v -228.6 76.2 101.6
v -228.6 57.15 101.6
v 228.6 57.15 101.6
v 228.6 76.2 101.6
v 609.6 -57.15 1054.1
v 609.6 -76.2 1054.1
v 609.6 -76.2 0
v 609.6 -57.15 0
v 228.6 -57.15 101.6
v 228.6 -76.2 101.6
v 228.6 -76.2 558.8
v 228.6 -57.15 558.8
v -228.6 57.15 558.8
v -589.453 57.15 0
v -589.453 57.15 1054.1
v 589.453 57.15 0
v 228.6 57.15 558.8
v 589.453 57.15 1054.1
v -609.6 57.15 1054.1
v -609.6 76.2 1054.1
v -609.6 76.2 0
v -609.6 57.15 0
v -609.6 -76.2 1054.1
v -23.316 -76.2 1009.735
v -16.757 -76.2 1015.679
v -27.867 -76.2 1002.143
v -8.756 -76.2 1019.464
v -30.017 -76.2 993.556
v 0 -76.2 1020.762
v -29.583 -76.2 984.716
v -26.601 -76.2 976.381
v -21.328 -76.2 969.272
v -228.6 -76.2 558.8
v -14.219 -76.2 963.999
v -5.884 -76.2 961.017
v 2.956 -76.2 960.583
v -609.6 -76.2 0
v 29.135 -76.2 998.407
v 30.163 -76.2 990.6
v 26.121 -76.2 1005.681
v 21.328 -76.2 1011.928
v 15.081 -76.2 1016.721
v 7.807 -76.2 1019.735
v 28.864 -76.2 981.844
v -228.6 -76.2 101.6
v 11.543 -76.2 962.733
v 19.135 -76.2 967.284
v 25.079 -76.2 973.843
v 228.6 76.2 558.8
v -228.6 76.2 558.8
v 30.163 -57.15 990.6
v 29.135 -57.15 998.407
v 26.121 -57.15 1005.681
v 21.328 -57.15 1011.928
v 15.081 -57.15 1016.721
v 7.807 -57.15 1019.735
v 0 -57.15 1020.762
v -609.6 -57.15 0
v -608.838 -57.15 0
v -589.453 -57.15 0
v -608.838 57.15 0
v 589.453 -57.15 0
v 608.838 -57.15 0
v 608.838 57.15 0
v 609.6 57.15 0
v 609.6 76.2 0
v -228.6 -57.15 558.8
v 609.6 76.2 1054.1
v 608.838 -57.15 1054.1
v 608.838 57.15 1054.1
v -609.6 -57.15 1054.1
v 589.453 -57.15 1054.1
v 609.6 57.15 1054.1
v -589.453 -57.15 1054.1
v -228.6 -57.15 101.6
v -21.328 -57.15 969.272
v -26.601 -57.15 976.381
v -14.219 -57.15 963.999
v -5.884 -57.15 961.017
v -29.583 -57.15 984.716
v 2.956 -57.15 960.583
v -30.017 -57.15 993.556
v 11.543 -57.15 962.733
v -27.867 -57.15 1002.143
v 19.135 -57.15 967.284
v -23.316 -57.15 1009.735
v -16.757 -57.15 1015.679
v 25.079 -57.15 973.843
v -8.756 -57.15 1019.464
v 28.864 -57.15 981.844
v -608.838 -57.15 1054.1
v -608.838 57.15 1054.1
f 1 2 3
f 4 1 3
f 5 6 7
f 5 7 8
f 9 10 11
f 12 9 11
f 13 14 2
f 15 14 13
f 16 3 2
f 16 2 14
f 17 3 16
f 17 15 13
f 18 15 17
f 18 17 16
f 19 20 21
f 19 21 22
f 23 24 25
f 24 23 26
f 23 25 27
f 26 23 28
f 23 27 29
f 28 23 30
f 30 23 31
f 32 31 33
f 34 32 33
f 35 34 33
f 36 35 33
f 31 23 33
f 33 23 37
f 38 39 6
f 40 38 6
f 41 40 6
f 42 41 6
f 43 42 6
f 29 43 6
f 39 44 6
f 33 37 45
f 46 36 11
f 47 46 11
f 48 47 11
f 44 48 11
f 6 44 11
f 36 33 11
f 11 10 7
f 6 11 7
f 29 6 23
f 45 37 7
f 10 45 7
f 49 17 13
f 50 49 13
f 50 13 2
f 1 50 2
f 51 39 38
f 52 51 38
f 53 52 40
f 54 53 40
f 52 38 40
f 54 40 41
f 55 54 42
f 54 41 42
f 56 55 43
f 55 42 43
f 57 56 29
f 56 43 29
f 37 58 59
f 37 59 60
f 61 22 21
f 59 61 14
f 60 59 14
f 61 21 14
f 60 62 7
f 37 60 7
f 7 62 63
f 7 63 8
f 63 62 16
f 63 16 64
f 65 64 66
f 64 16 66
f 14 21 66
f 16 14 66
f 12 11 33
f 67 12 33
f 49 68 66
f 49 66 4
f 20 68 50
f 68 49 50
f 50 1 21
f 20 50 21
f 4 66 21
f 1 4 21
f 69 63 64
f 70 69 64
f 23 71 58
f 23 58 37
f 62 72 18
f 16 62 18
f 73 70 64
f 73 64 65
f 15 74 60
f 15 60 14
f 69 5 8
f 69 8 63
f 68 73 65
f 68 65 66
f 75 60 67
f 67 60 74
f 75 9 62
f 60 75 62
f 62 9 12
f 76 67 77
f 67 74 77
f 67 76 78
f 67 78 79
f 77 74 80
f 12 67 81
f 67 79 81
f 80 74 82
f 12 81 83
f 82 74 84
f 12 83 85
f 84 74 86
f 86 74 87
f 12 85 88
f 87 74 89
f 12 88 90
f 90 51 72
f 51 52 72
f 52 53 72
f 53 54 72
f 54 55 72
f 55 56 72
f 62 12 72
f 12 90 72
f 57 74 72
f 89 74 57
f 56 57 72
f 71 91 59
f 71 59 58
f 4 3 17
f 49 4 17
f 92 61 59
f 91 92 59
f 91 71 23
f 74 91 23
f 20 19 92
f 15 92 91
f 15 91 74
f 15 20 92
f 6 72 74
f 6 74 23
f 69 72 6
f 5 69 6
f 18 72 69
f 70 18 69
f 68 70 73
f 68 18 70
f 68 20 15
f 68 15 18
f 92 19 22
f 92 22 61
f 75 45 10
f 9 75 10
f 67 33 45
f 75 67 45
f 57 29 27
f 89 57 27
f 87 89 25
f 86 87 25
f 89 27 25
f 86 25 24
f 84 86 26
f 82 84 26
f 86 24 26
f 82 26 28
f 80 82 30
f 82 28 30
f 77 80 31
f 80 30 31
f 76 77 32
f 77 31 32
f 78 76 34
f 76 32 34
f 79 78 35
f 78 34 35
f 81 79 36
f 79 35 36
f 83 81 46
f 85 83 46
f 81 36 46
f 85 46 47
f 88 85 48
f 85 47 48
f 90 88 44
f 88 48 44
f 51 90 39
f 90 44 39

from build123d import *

# Parameters (mm, degrees)
F1_DEPTH = 1054.1
F3_DEPTH = 152.4
F4_W     = 1178.906798
F4_H     = 114.3
F5_DEPTH = 1270
F7_DEPTH = 25.4


with BuildPart() as f1:
    # F0 (on Top) → F1 (new body)
    with BuildSketch(Plane.XY):
        Polygon((609.6, 57.15), (609.6, 76.2), (-609.6, 76.2), (-609.6, 57.15), (-608.838, 57.15), (-608.838, -57.15), (-609.6, -57.15), (-609.6, -76.2), (609.6, -76.2), (609.6, -57.15), (608.838, -57.15), (608.838, 57.15), align=None)
    extrude(amount=F1_DEPTH)

    # F2 (on face) → F3 (cut)
    with BuildSketch(Plane.XZ.offset(76.2)):
        Polygon((-228.6, 101.6), (0, 101.6), (228.6, 101.6), (228.6, 558.8), (-228.6, 558.8), align=None)
    extrude(amount=-F3_DEPTH, mode=Mode.SUBTRACT)

    # F4 (on face) → F5 (cut)
    with BuildSketch(Plane.XY.offset(1054.1)):
        Rectangle(F4_W, F4_H)
    extrude(amount=-F5_DEPTH, mode=Mode.SUBTRACT)

    # F6 (on face) → F7 (cut)
    with BuildSketch(Plane.XZ.offset(76.2)):
        with BuildLine():
            ThreePointArc((0, 1020.7625), (-21.328108, 969.271892), (30.1625, 990.6))
            ThreePointArc((30.1625, 990.6), (21.328108, 1011.928108), (0, 1020.7625))
        make_face()
    extrude(amount=-F7_DEPTH, mode=Mode.SUBTRACT)


solid = f1.part
